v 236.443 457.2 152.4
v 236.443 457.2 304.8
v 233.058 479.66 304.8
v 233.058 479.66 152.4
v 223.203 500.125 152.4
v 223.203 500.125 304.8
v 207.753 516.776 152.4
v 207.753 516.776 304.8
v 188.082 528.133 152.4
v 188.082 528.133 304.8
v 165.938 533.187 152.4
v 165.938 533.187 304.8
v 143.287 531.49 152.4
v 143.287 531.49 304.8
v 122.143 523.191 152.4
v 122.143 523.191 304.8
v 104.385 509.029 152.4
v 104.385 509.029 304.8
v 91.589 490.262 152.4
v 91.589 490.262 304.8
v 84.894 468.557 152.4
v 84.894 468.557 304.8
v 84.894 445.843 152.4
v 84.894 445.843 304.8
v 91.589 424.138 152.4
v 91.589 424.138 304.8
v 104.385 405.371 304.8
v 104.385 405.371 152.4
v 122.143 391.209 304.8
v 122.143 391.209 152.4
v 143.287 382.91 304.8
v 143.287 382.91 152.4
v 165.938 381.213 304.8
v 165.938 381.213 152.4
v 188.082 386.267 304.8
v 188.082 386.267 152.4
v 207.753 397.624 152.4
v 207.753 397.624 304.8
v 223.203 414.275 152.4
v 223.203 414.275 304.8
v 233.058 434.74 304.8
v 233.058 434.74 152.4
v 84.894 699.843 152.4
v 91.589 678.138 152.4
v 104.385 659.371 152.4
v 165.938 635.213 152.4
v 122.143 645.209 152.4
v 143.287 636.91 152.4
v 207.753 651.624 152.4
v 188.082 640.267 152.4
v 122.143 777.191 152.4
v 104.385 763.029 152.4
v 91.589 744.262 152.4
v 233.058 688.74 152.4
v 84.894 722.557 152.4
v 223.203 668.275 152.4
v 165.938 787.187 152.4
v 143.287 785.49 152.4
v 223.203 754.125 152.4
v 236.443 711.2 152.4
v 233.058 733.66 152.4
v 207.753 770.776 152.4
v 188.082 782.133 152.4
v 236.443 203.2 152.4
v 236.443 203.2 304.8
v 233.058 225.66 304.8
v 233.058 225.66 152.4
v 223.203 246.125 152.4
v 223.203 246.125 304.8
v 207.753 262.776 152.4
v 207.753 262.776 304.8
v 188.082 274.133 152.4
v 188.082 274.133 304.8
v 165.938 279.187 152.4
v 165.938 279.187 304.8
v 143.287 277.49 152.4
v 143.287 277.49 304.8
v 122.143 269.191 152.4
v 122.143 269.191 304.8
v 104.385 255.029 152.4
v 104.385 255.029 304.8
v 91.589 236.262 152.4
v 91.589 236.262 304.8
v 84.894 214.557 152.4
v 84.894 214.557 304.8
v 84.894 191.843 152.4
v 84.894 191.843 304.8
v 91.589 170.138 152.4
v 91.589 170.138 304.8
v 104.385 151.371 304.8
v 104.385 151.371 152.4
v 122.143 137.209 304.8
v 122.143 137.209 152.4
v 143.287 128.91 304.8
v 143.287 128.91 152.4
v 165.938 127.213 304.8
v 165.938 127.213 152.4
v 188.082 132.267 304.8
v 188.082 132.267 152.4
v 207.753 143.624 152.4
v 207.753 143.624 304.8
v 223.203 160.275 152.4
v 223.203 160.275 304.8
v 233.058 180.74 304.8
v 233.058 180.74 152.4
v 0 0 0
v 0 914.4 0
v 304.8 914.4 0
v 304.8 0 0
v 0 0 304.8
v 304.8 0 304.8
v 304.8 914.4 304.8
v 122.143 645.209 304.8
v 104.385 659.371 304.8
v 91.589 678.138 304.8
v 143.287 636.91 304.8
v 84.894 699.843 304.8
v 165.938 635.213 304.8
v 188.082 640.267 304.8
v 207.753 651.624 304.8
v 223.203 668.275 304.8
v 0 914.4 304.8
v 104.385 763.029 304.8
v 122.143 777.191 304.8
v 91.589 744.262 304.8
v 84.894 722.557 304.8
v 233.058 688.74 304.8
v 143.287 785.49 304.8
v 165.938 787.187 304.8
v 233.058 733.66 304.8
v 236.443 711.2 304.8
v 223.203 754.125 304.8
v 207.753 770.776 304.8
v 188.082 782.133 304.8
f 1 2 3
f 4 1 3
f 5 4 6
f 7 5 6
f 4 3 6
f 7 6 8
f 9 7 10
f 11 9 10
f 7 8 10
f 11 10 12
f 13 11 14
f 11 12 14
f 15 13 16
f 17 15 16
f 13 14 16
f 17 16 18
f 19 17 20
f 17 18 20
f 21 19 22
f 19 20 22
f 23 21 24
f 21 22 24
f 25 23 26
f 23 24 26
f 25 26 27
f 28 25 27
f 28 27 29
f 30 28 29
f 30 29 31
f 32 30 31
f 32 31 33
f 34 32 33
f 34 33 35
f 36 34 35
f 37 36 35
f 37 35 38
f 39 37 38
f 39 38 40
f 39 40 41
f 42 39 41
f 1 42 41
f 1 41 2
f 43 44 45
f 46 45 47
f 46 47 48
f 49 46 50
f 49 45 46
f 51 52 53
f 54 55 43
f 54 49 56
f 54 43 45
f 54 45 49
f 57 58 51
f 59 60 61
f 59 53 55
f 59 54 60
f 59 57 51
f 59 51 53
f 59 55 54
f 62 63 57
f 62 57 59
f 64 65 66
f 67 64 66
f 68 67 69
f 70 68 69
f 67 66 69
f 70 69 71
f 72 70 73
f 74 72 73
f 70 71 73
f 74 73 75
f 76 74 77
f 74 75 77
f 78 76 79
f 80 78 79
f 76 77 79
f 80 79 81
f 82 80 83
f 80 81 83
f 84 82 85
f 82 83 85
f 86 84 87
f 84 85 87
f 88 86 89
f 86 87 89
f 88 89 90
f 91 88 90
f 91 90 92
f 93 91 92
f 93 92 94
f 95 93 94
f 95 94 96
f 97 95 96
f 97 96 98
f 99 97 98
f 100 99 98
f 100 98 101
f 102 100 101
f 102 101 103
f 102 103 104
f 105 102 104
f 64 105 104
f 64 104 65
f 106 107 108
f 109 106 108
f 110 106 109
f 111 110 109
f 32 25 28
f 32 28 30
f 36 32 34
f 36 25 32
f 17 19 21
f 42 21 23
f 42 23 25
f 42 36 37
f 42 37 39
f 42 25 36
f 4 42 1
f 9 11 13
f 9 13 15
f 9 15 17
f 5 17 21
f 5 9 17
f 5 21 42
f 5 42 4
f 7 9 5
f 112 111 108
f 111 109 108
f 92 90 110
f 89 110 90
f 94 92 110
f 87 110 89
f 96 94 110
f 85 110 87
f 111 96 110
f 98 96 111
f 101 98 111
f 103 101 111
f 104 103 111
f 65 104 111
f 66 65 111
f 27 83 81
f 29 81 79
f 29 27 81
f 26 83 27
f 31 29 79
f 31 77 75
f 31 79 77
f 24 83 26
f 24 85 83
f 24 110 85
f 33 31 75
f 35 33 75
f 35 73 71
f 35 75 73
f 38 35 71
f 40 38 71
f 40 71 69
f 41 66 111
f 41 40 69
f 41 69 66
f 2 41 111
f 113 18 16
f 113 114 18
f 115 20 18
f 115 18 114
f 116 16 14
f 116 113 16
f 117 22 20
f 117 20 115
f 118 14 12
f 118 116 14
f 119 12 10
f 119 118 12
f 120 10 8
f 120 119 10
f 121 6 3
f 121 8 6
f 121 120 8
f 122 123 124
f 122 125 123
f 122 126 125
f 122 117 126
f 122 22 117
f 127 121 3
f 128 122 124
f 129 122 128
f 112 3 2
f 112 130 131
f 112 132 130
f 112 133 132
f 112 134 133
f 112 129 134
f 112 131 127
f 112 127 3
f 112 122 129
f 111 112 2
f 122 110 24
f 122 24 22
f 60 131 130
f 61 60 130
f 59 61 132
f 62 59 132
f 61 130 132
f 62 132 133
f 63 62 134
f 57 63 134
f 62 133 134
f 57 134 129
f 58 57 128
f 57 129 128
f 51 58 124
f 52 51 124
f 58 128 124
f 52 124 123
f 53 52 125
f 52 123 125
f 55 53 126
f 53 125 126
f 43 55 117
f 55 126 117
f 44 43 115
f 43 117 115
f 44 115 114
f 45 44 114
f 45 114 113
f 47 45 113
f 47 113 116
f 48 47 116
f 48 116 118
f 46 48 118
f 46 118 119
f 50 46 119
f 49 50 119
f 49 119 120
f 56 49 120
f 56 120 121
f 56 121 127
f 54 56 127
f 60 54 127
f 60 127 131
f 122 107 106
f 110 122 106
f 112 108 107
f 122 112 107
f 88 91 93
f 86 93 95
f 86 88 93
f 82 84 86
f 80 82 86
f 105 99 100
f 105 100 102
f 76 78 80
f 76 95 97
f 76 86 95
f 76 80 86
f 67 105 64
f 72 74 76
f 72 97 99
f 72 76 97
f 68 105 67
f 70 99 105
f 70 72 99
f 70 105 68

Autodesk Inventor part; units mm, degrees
ref_plane "YZ Plane" through (0, 0, 0) normal (1, 0, 0) x (0, 1, 0)
ref_plane "XZ Plane" through (0, 0, 0) normal (0, 1, 0) x (-1, 0, 0)
ref_plane "XY Plane" through (0, 0, 0) normal (0, 0, 1) x (1, 0, 0)
sketch "Sketch1" plane through (0, 0, 0) normal (0, 0, 1) x (1, 0, 0)
  line L0 (0, 0) -> (304.8, 0)
  line L1 (304.8, 0) -> (304.8, 914.4)
  line L2 (304.8, 914.4) -> (0, 914.4)
  line L3 (0, 914.4) -> (0, 0)
  dimension "d0" = 304.8
  dimension "d1" = 914.4
extrude "Extrusion1" add sketch "Sketch1" along normal blind 304.8
sketch "Sketch2" plane through (0, 0, 304.8) normal (0, 0, 1) x (1, 0, 0)
  line L0 (0, 0) -> (304.8, 0) projected
  line L1 (304.8, 0) -> (304.8, 914.4) projected
  line L2 (304.8, 914.4) -> (0, 914.4) projected
  line L3 (0, 914.4) -> (0, 0) projected
  circle A0 centre (160.2433, 711.2) radius 76.2
  circle A1 centre (160.2433, 457.2) radius 76.2
  circle A2 centre (160.2433, 203.2) radius 76.2
  line L4 (304.8, 914.4) -> (0, 914.4) construction
  line L5 (160.2433, 914.4) -> (160.2433, 895.9675) construction
  dimension "d4" = 152.4
  dimension "d5" = 0
  dimension "d6" = 152.4
  dimension "d7" = 152.4
  dimension "d8" = 254
  dimension "d9" = 254
  dimension "d10" = -203.2
extrude "Extrusion2" cut sketch "Sketch2" against normal blind 152.4 contours A0 | A1 | A2
equation "\"d6\" = d4"
equation "\"d7\" = d4"
equation "\"d9\" = d8"
equation "\"d10\" = -0.5 * d1 + d8"
properties part number "traffic light"
